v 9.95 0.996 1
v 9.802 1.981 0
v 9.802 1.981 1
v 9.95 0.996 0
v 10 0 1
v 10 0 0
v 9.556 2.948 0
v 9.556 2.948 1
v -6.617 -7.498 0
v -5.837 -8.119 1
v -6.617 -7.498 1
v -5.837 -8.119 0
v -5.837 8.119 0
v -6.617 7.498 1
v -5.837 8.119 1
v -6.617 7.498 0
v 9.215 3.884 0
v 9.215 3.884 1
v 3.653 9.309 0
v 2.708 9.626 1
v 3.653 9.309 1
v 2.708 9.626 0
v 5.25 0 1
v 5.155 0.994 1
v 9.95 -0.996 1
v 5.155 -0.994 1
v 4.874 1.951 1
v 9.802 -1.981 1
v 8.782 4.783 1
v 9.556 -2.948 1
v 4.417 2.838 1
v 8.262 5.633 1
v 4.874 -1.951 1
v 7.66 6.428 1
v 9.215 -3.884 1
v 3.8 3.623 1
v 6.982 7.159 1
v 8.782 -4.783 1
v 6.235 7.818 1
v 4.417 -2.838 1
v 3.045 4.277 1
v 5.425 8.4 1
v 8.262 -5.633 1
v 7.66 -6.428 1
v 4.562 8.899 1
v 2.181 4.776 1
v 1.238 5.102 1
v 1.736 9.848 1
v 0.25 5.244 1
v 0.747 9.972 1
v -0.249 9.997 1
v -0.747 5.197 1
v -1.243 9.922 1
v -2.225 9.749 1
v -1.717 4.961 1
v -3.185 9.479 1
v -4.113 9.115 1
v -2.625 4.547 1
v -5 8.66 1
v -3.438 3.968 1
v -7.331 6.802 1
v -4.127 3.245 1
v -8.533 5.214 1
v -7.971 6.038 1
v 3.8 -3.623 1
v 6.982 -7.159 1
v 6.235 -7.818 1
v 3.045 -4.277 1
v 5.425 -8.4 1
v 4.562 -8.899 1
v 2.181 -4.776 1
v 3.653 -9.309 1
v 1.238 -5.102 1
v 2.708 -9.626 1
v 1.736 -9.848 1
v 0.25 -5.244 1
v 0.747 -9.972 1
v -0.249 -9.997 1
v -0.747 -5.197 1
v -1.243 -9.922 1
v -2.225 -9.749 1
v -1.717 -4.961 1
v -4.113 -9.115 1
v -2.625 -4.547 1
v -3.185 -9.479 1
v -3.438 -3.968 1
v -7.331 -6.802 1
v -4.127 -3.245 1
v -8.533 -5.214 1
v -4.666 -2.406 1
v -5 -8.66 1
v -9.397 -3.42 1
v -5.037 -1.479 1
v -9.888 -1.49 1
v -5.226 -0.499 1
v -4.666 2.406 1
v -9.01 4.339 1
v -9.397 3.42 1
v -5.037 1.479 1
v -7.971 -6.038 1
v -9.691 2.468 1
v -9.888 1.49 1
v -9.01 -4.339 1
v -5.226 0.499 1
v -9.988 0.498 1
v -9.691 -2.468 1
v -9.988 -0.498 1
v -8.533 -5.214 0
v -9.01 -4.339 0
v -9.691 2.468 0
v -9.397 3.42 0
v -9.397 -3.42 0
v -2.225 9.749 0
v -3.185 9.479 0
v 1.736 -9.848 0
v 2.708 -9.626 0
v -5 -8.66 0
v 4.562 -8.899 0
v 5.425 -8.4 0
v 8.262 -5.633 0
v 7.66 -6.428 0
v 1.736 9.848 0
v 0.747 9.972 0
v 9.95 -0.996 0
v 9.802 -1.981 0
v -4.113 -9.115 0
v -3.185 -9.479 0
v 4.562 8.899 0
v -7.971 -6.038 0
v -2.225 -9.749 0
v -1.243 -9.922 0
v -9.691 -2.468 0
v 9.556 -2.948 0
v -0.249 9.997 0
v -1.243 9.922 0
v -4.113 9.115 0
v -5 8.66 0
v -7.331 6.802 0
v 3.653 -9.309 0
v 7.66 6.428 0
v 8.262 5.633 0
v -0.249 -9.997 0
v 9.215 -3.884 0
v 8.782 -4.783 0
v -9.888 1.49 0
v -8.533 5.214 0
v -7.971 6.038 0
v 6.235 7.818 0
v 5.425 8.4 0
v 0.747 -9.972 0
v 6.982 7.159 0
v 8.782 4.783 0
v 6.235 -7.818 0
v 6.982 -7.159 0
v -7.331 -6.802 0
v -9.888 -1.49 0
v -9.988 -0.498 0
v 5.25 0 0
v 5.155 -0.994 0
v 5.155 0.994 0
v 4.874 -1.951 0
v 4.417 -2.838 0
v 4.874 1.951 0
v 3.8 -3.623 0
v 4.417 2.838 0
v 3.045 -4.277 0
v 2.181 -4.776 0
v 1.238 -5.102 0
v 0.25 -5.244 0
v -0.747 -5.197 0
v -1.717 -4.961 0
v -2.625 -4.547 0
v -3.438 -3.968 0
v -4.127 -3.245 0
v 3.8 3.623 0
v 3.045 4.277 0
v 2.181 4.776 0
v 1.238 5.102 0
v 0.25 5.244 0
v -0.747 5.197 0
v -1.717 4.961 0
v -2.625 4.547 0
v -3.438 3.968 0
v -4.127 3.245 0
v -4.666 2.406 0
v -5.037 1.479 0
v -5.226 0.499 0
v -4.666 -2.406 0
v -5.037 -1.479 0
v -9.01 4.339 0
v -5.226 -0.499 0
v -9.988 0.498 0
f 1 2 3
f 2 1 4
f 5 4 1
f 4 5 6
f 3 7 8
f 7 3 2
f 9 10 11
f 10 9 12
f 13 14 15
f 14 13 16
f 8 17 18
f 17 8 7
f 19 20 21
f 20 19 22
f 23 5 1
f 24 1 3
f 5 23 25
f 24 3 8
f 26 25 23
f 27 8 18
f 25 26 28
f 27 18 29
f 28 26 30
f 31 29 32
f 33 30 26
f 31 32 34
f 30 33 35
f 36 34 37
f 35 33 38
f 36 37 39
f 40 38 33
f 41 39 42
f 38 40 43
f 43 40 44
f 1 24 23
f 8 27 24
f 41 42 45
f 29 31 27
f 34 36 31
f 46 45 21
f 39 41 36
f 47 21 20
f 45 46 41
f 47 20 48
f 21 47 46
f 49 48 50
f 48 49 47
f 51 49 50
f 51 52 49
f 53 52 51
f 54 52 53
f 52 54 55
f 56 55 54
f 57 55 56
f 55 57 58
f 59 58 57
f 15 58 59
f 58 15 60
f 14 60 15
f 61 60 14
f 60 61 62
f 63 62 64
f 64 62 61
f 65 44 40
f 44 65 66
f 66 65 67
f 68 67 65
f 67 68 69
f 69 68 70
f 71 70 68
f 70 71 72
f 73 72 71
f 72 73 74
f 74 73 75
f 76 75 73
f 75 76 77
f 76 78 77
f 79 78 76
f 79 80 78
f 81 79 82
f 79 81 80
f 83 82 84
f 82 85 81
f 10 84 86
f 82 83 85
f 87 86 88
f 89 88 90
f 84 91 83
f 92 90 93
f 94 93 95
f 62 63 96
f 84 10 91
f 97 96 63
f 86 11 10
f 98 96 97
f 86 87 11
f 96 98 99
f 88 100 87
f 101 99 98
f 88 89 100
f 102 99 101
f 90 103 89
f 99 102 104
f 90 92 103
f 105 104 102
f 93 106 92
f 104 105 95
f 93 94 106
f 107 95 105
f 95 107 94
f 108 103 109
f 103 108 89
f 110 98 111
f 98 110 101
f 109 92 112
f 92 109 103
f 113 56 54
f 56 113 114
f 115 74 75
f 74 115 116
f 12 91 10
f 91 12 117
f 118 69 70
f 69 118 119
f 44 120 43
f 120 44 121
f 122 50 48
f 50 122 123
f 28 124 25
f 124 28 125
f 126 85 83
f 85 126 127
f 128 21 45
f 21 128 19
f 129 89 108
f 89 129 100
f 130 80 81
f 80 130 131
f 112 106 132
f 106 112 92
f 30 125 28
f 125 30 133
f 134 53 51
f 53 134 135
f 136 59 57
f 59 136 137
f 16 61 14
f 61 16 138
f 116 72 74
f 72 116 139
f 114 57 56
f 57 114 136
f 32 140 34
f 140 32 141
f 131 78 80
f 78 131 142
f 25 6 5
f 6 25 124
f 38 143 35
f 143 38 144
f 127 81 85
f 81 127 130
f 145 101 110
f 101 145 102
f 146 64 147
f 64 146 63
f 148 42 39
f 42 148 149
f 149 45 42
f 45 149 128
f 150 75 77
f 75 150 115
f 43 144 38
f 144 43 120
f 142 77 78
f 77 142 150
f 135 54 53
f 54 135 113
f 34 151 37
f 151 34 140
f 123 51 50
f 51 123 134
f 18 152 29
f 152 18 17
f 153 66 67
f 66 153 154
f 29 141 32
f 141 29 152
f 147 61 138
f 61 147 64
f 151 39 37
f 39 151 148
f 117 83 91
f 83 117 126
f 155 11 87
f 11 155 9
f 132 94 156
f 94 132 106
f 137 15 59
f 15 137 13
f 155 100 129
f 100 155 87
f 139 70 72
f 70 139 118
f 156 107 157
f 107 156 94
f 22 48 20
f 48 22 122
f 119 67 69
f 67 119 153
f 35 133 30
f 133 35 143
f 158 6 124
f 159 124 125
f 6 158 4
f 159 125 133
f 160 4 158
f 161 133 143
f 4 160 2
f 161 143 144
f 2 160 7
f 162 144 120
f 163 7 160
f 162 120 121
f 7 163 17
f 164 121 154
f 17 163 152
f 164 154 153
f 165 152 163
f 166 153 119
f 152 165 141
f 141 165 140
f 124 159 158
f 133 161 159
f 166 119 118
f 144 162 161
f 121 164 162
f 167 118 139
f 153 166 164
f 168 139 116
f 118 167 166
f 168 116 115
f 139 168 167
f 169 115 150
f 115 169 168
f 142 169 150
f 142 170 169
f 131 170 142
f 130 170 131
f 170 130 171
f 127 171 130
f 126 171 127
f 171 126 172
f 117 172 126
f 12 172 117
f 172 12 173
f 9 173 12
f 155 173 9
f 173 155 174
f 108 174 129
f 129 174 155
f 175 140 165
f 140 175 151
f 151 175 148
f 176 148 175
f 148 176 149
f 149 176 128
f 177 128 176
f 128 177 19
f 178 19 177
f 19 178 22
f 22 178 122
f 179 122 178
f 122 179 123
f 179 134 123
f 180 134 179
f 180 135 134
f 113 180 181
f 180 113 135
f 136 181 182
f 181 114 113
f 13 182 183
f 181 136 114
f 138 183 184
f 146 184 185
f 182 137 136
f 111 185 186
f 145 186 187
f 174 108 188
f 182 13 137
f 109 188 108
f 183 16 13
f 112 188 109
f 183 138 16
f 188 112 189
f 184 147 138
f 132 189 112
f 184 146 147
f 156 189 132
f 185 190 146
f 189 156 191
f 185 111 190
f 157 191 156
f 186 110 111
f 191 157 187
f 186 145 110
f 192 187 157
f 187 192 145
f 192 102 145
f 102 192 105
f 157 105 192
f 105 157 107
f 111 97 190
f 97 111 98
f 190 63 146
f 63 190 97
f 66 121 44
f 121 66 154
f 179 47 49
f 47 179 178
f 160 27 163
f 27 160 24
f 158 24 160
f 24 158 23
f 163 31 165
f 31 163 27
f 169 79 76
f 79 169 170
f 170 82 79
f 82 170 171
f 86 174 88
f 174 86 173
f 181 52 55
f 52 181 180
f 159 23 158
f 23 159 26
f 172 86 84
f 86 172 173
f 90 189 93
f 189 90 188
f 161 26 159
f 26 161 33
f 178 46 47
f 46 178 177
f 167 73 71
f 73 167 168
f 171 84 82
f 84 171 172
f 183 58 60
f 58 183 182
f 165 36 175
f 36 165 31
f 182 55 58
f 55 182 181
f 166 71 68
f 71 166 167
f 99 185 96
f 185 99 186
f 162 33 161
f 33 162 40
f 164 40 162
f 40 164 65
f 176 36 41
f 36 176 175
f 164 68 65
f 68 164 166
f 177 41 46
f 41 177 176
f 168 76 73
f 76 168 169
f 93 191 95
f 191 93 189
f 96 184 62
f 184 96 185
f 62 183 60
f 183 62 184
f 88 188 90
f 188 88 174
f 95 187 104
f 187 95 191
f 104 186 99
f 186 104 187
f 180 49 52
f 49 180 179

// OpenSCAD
// -*- mode: SCAD ; c-file-style: "ellemtel" ; coding: utf-8 -*-
//
// Buchsen oder Unterlegscheiben, nach Bedarf
//
// (c) 2017 Roland Sieker <ospalh@gmail.com>
// Licence: CC-0 4.0

d_i = 10.5;
r_i = d_i/2;
h = 1;
d_o = 20;
r_o = d_o/2;
ms = 0.01;  // Muggeseggele


preview = 1;

// fn for differently sized objects and fs, fa; all for preview or rendering.
pna = 40;
pnb = 15;
pa = 5;
ps = 1;
rna = 180;
rnb = 30;
ra = 1;
rs = 0.1;
function na() = (preview) ? pna : rna;
function nb() = (preview) ? pnb : rnb;
$fs = (preview) ? ps : rs;
$fa = (preview) ? pa : ra;


difference()
{
    cylinder(r=r_o, h=h);
    translate([0,0,-ms])
    {
        cylinder(r=r_i, h=h+2*ms);
    }
}
